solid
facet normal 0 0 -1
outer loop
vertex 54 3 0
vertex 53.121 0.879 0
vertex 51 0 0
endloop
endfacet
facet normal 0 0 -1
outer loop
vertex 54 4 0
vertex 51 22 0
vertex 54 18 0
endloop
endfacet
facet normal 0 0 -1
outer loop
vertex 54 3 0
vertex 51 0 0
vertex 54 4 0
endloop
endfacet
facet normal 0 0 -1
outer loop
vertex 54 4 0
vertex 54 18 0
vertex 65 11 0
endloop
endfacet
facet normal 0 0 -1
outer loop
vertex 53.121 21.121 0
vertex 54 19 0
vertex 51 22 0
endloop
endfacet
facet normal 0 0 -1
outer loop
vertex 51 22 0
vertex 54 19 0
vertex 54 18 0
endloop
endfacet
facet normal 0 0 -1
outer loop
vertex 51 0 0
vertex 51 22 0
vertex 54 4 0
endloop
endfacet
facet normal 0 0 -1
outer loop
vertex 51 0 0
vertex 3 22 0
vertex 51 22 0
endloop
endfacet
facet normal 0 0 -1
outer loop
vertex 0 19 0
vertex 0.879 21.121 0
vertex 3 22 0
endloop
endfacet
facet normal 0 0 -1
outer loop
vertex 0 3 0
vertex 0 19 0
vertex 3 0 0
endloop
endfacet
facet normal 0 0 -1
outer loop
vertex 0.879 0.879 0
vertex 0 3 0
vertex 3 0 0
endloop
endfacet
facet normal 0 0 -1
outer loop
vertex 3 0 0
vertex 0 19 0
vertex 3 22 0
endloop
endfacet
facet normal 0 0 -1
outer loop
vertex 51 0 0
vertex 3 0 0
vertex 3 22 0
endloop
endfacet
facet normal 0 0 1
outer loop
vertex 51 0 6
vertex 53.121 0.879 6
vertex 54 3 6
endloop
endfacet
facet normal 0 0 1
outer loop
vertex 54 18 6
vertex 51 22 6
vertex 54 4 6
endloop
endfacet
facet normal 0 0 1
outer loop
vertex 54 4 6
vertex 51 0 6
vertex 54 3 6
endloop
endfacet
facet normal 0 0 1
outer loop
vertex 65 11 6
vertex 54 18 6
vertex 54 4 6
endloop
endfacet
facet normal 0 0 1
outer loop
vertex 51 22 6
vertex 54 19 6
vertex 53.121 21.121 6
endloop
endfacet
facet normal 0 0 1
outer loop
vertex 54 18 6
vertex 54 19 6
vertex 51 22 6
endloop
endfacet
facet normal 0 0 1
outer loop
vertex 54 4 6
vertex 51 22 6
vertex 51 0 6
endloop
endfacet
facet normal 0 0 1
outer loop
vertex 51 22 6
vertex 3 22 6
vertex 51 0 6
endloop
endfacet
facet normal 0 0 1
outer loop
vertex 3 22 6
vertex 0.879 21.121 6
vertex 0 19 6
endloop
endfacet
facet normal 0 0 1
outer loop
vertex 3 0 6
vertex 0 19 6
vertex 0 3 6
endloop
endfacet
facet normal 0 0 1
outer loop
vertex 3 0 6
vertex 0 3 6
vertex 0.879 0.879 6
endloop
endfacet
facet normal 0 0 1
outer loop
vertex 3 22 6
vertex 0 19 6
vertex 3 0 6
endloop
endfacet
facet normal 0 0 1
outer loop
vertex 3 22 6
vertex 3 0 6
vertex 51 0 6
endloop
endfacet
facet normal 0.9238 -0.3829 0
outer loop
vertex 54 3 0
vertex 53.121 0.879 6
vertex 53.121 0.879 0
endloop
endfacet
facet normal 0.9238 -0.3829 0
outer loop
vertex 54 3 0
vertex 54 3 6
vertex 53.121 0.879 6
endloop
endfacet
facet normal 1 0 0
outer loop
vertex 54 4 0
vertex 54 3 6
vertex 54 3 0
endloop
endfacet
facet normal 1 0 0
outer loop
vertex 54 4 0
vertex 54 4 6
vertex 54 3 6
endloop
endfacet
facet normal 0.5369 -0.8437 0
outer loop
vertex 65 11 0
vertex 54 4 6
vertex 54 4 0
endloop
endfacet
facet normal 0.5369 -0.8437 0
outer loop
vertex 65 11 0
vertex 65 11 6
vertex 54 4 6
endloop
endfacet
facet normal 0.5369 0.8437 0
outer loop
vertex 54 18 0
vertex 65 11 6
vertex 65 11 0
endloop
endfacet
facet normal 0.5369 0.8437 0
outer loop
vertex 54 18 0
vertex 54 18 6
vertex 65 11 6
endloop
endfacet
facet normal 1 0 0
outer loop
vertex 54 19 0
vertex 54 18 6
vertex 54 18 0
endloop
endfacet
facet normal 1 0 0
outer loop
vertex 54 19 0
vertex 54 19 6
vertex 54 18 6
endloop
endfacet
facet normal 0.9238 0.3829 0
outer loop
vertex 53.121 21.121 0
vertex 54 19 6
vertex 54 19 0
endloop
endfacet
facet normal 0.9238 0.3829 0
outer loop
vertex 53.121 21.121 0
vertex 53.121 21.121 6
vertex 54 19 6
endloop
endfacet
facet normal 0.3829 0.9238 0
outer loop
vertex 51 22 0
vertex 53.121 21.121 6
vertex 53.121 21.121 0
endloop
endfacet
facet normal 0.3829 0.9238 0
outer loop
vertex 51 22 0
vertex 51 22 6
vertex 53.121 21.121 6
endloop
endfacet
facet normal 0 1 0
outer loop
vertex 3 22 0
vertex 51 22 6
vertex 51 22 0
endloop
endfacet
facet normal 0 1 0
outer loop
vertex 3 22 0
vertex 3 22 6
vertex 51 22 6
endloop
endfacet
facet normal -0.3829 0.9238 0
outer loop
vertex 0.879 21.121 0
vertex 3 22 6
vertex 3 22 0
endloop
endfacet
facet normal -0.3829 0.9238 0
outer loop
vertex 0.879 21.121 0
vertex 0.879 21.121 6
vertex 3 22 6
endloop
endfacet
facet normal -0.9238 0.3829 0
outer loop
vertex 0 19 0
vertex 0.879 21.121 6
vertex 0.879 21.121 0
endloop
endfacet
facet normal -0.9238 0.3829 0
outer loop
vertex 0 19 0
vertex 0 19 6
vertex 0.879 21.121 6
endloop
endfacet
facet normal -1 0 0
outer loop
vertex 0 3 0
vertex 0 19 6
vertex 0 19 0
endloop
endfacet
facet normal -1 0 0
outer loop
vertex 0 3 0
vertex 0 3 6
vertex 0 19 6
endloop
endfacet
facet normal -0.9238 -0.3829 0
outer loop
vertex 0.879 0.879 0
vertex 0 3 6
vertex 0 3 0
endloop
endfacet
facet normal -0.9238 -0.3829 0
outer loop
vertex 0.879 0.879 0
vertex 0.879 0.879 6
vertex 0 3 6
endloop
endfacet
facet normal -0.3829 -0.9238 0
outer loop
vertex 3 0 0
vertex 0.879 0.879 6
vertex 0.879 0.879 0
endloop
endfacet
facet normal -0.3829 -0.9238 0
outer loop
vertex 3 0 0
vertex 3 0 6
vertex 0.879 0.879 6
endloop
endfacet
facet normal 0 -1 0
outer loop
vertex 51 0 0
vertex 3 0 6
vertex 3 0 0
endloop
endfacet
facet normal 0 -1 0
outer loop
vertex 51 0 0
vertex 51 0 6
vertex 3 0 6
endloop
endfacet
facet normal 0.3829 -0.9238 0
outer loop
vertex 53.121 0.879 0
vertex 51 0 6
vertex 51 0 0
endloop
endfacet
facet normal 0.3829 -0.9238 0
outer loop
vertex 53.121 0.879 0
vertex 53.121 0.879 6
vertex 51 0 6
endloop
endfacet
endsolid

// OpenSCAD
$fn = 32;

// ----------------------------------------------------------------------
// Ratchet pawl: 54 x 22 mm body, beak 11 mm с правого торца
// ----------------------------------------------------------------------

// --- parameters (mm) ---
profile_height = 6;       // extrusion height
profile_points = 15;      // points of the closed outline

profile = [[0, 3], [0.879, 0.879], [3, 0], [51, 0], [53.121, 0.879], [54, 3], [54, 4], [65, 11], [54, 18], [54, 19], [53.121, 21.121], [51, 22], [3, 22], [0.879, 21.121], [0, 19]];  // single closed polygon, 15 points, counter clockwise

// --- the one profile operation ---
linear_extrude(height = profile_height) polygon(points = profile);
